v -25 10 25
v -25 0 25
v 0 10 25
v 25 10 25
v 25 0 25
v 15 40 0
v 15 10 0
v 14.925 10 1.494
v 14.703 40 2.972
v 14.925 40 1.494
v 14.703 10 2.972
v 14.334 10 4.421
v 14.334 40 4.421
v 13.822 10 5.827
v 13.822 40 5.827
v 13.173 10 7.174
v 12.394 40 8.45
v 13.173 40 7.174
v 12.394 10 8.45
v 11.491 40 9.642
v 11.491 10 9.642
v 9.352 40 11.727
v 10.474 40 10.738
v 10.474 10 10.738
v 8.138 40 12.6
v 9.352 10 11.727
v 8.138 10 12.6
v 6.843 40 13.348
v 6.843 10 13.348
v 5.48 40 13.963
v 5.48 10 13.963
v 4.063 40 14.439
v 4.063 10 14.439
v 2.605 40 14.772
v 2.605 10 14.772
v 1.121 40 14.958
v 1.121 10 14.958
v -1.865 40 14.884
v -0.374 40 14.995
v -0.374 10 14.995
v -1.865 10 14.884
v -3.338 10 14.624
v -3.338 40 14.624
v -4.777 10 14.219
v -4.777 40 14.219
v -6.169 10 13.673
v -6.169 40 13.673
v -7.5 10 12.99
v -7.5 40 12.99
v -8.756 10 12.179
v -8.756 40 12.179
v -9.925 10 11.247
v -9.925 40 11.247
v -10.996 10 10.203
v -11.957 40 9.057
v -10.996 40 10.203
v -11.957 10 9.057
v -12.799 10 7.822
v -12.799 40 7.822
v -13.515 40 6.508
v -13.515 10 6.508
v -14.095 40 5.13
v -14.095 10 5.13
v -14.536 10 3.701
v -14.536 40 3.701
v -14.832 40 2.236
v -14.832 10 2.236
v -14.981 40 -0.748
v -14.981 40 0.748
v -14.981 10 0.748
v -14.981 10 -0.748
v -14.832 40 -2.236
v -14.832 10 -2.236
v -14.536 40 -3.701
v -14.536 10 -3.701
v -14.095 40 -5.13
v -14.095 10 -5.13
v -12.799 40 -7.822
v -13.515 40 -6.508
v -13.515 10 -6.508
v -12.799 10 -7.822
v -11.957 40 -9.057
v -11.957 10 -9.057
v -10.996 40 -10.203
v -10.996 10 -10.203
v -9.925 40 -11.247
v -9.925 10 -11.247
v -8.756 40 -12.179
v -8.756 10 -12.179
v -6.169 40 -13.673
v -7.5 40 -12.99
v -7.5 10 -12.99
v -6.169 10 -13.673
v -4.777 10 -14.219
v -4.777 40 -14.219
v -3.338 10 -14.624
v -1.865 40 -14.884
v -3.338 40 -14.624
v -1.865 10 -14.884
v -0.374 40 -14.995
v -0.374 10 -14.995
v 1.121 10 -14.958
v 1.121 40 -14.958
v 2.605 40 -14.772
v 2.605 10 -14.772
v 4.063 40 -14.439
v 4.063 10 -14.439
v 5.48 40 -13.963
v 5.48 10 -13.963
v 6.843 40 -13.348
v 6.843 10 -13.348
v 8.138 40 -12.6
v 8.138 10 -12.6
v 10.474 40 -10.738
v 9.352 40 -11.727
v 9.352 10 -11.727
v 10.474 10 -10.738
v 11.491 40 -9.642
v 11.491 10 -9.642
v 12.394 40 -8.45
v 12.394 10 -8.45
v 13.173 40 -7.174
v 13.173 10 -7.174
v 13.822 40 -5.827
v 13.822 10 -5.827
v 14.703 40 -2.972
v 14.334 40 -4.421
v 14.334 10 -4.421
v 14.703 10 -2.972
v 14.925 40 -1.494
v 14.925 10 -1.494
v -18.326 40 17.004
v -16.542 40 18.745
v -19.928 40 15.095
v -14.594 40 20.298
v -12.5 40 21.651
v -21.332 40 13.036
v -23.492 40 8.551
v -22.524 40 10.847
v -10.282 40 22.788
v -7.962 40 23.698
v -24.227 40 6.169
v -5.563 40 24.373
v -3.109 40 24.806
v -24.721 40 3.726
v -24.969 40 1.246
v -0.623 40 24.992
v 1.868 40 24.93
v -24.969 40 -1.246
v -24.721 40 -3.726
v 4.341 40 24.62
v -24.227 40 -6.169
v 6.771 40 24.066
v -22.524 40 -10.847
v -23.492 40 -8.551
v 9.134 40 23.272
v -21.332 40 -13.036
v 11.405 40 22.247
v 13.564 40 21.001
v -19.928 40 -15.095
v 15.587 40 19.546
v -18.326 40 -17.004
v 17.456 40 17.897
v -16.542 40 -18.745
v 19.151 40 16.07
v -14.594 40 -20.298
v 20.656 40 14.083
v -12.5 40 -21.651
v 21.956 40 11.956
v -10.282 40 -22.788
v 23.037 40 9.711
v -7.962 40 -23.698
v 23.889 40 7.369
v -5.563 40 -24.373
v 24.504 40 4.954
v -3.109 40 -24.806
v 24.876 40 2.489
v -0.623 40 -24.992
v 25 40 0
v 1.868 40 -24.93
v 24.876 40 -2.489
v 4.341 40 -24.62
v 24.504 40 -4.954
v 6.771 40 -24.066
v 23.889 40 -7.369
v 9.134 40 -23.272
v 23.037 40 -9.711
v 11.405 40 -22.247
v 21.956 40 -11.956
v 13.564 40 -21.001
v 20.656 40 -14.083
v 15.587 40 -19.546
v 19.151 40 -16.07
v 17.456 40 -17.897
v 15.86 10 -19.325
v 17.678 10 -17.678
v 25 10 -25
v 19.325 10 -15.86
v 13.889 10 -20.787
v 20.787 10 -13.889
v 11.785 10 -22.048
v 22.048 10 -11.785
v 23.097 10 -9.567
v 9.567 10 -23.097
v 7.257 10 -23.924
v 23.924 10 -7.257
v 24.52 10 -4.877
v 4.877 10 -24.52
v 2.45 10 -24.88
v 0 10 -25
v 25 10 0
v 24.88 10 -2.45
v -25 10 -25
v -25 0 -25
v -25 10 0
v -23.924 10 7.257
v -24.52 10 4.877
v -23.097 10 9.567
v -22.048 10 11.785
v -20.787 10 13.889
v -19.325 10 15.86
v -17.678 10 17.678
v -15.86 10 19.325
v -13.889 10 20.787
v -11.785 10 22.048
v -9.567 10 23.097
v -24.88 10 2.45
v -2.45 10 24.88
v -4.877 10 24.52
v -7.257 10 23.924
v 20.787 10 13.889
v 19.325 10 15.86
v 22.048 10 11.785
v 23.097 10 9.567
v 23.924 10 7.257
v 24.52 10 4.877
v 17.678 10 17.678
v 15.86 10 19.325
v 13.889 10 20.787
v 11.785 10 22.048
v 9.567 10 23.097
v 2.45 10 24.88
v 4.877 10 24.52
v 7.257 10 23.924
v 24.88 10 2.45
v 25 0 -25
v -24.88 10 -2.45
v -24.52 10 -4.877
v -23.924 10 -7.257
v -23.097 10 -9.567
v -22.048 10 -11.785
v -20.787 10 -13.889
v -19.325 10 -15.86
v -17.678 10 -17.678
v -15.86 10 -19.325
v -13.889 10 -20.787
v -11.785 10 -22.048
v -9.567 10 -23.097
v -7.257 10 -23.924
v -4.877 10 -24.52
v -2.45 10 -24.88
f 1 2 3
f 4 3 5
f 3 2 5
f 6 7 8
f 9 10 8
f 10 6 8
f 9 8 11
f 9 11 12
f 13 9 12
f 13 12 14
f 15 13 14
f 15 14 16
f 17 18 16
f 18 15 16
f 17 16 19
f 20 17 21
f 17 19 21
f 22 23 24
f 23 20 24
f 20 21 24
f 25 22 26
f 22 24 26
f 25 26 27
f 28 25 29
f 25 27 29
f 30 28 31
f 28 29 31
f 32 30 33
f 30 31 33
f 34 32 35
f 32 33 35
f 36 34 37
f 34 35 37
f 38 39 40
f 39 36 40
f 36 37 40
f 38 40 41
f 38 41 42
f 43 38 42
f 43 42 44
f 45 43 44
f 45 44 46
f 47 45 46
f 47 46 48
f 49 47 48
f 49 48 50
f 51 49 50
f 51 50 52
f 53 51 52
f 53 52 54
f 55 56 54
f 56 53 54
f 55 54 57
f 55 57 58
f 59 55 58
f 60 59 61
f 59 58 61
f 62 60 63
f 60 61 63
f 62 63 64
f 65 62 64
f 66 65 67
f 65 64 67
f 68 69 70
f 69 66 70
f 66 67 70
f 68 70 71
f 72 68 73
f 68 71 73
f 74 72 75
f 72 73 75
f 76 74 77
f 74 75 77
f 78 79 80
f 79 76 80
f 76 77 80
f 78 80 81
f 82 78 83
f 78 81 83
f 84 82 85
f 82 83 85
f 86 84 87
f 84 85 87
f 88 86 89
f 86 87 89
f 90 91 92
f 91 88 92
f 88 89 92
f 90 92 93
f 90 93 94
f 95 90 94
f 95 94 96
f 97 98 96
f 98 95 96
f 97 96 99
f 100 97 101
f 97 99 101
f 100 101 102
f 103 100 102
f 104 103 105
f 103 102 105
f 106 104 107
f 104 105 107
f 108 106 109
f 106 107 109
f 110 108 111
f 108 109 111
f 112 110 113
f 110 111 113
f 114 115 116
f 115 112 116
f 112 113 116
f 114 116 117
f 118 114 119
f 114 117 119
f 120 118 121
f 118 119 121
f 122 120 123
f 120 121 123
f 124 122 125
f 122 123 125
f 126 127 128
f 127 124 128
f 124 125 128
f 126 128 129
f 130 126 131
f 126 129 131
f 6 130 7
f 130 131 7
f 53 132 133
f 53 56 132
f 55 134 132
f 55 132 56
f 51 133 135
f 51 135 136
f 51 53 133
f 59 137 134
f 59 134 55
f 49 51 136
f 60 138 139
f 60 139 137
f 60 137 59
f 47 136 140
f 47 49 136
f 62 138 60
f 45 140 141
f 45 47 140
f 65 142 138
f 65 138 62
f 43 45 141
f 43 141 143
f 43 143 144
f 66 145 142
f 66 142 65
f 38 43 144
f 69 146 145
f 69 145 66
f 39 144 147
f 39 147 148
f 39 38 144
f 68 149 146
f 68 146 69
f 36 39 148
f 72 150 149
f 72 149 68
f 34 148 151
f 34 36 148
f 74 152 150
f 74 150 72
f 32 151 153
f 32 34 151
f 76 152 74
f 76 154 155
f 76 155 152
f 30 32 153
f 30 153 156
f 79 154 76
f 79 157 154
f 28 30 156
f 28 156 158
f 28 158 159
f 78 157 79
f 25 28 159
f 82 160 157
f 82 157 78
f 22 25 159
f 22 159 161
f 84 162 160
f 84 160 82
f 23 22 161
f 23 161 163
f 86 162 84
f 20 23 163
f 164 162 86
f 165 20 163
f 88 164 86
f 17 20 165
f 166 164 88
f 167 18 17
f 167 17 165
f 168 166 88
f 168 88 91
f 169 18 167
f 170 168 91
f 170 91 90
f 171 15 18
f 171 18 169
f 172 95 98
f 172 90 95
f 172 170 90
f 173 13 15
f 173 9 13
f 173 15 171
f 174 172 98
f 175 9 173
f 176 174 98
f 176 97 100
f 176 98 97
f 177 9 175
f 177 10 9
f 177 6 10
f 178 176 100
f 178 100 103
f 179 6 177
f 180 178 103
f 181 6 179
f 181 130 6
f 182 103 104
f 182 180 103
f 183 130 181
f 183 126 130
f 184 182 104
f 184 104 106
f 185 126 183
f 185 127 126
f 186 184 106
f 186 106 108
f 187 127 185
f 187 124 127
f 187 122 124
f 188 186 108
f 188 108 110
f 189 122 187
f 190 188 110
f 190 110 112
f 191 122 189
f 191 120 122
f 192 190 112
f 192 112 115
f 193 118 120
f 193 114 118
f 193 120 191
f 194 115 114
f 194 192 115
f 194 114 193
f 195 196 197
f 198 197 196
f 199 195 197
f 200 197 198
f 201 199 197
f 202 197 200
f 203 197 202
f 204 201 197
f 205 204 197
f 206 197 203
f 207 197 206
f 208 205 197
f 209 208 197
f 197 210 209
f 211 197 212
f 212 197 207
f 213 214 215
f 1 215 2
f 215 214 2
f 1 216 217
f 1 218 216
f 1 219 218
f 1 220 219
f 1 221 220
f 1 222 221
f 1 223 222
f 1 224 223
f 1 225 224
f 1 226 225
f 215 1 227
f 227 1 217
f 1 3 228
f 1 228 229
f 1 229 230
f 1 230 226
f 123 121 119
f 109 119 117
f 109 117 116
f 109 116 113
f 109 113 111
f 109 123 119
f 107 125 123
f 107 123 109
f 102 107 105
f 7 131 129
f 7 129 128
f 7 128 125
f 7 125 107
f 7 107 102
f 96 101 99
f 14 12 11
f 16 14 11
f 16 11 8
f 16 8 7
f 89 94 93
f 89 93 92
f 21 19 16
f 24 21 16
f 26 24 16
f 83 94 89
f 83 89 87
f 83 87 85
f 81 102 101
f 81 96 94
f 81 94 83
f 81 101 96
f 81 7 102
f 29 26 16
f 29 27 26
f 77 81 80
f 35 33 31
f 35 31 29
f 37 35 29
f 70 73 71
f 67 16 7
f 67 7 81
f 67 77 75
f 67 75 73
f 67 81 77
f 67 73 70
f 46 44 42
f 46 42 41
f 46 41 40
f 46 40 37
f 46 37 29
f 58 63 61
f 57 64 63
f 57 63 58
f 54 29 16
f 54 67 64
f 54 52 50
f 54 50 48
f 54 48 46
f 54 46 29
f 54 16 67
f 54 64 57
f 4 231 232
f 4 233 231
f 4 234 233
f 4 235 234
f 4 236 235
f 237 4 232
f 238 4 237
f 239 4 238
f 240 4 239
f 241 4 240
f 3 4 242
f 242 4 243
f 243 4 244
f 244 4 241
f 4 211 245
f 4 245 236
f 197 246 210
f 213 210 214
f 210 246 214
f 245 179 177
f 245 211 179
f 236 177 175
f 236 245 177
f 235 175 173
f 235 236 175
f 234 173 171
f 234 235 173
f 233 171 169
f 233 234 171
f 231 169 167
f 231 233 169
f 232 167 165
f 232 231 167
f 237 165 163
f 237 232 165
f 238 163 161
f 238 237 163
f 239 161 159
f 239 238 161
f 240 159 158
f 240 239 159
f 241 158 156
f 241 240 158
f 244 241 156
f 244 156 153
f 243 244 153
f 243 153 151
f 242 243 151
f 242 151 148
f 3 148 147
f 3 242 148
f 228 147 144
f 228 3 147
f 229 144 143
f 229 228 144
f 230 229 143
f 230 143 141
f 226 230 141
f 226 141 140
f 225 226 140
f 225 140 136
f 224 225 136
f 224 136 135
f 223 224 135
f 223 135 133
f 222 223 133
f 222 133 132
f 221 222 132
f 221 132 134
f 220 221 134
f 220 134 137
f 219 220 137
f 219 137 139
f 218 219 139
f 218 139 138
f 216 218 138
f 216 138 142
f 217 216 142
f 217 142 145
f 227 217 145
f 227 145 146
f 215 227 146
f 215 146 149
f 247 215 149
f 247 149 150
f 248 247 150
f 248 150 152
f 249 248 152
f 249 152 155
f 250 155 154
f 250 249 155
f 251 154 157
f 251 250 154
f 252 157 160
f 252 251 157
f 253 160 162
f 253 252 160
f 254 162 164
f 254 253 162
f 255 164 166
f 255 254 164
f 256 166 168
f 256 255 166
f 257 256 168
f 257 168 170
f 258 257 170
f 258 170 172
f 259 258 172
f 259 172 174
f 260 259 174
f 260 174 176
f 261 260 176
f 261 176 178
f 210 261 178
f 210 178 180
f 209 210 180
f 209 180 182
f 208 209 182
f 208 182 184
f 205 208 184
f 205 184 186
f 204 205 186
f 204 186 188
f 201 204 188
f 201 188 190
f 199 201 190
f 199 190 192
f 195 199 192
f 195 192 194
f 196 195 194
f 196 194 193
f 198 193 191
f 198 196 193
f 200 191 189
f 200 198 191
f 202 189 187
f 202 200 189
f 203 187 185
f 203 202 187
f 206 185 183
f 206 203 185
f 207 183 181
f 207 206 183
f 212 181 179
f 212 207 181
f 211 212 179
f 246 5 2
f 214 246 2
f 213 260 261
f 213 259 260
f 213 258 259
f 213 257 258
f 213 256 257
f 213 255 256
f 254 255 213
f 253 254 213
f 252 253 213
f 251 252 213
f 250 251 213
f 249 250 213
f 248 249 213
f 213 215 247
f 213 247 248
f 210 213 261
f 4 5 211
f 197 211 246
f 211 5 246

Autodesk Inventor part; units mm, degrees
ref_plane "YZ Plane" through (0, 0, 0) normal (1, 0, 0) x (0, 1, 0)
ref_plane "XZ Plane" through (0, 0, 0) normal (0, 1, 0) x (-1, 0, 0)
ref_plane "XY Plane" through (0, 0, 0) normal (0, 0, 1) x (1, 0, 0)
sketch "Sketch1" plane through (0, 0, 0) normal (0, 1, 0) x (-1, 0, 0)
  line L0 (25, 25) -> (-25, 25)
  line L1 (-25, 25) -> (-25, -25)
  line L2 (-25, -25) -> (25, -25)
  line L3 (25, -25) -> (25, 25)
  line L4 (25, 25) -> (-25, -25) construction
  line L5 (-25, 25) -> (25, -25) construction
  point P0 (0, 0)
  dimension "d0" = 50
  dimension "d1" = 50
extrude "Extrusion1" add sketch "Sketch1" along normal blind 10
sketch "Sketch4" plane through (0, 10, 0) normal (0, 1, 0) x (1, 0, 0)
  circle A0 centre (0, 0) radius 25
  circle A1 centre (0, 0) radius 15
  dimension "d9" = 50
  dimension "d10" = 30
extrude "Extrusion3" add sketch "Sketch4" along normal blind 30
properties part number "Manipulator Base Type2"
